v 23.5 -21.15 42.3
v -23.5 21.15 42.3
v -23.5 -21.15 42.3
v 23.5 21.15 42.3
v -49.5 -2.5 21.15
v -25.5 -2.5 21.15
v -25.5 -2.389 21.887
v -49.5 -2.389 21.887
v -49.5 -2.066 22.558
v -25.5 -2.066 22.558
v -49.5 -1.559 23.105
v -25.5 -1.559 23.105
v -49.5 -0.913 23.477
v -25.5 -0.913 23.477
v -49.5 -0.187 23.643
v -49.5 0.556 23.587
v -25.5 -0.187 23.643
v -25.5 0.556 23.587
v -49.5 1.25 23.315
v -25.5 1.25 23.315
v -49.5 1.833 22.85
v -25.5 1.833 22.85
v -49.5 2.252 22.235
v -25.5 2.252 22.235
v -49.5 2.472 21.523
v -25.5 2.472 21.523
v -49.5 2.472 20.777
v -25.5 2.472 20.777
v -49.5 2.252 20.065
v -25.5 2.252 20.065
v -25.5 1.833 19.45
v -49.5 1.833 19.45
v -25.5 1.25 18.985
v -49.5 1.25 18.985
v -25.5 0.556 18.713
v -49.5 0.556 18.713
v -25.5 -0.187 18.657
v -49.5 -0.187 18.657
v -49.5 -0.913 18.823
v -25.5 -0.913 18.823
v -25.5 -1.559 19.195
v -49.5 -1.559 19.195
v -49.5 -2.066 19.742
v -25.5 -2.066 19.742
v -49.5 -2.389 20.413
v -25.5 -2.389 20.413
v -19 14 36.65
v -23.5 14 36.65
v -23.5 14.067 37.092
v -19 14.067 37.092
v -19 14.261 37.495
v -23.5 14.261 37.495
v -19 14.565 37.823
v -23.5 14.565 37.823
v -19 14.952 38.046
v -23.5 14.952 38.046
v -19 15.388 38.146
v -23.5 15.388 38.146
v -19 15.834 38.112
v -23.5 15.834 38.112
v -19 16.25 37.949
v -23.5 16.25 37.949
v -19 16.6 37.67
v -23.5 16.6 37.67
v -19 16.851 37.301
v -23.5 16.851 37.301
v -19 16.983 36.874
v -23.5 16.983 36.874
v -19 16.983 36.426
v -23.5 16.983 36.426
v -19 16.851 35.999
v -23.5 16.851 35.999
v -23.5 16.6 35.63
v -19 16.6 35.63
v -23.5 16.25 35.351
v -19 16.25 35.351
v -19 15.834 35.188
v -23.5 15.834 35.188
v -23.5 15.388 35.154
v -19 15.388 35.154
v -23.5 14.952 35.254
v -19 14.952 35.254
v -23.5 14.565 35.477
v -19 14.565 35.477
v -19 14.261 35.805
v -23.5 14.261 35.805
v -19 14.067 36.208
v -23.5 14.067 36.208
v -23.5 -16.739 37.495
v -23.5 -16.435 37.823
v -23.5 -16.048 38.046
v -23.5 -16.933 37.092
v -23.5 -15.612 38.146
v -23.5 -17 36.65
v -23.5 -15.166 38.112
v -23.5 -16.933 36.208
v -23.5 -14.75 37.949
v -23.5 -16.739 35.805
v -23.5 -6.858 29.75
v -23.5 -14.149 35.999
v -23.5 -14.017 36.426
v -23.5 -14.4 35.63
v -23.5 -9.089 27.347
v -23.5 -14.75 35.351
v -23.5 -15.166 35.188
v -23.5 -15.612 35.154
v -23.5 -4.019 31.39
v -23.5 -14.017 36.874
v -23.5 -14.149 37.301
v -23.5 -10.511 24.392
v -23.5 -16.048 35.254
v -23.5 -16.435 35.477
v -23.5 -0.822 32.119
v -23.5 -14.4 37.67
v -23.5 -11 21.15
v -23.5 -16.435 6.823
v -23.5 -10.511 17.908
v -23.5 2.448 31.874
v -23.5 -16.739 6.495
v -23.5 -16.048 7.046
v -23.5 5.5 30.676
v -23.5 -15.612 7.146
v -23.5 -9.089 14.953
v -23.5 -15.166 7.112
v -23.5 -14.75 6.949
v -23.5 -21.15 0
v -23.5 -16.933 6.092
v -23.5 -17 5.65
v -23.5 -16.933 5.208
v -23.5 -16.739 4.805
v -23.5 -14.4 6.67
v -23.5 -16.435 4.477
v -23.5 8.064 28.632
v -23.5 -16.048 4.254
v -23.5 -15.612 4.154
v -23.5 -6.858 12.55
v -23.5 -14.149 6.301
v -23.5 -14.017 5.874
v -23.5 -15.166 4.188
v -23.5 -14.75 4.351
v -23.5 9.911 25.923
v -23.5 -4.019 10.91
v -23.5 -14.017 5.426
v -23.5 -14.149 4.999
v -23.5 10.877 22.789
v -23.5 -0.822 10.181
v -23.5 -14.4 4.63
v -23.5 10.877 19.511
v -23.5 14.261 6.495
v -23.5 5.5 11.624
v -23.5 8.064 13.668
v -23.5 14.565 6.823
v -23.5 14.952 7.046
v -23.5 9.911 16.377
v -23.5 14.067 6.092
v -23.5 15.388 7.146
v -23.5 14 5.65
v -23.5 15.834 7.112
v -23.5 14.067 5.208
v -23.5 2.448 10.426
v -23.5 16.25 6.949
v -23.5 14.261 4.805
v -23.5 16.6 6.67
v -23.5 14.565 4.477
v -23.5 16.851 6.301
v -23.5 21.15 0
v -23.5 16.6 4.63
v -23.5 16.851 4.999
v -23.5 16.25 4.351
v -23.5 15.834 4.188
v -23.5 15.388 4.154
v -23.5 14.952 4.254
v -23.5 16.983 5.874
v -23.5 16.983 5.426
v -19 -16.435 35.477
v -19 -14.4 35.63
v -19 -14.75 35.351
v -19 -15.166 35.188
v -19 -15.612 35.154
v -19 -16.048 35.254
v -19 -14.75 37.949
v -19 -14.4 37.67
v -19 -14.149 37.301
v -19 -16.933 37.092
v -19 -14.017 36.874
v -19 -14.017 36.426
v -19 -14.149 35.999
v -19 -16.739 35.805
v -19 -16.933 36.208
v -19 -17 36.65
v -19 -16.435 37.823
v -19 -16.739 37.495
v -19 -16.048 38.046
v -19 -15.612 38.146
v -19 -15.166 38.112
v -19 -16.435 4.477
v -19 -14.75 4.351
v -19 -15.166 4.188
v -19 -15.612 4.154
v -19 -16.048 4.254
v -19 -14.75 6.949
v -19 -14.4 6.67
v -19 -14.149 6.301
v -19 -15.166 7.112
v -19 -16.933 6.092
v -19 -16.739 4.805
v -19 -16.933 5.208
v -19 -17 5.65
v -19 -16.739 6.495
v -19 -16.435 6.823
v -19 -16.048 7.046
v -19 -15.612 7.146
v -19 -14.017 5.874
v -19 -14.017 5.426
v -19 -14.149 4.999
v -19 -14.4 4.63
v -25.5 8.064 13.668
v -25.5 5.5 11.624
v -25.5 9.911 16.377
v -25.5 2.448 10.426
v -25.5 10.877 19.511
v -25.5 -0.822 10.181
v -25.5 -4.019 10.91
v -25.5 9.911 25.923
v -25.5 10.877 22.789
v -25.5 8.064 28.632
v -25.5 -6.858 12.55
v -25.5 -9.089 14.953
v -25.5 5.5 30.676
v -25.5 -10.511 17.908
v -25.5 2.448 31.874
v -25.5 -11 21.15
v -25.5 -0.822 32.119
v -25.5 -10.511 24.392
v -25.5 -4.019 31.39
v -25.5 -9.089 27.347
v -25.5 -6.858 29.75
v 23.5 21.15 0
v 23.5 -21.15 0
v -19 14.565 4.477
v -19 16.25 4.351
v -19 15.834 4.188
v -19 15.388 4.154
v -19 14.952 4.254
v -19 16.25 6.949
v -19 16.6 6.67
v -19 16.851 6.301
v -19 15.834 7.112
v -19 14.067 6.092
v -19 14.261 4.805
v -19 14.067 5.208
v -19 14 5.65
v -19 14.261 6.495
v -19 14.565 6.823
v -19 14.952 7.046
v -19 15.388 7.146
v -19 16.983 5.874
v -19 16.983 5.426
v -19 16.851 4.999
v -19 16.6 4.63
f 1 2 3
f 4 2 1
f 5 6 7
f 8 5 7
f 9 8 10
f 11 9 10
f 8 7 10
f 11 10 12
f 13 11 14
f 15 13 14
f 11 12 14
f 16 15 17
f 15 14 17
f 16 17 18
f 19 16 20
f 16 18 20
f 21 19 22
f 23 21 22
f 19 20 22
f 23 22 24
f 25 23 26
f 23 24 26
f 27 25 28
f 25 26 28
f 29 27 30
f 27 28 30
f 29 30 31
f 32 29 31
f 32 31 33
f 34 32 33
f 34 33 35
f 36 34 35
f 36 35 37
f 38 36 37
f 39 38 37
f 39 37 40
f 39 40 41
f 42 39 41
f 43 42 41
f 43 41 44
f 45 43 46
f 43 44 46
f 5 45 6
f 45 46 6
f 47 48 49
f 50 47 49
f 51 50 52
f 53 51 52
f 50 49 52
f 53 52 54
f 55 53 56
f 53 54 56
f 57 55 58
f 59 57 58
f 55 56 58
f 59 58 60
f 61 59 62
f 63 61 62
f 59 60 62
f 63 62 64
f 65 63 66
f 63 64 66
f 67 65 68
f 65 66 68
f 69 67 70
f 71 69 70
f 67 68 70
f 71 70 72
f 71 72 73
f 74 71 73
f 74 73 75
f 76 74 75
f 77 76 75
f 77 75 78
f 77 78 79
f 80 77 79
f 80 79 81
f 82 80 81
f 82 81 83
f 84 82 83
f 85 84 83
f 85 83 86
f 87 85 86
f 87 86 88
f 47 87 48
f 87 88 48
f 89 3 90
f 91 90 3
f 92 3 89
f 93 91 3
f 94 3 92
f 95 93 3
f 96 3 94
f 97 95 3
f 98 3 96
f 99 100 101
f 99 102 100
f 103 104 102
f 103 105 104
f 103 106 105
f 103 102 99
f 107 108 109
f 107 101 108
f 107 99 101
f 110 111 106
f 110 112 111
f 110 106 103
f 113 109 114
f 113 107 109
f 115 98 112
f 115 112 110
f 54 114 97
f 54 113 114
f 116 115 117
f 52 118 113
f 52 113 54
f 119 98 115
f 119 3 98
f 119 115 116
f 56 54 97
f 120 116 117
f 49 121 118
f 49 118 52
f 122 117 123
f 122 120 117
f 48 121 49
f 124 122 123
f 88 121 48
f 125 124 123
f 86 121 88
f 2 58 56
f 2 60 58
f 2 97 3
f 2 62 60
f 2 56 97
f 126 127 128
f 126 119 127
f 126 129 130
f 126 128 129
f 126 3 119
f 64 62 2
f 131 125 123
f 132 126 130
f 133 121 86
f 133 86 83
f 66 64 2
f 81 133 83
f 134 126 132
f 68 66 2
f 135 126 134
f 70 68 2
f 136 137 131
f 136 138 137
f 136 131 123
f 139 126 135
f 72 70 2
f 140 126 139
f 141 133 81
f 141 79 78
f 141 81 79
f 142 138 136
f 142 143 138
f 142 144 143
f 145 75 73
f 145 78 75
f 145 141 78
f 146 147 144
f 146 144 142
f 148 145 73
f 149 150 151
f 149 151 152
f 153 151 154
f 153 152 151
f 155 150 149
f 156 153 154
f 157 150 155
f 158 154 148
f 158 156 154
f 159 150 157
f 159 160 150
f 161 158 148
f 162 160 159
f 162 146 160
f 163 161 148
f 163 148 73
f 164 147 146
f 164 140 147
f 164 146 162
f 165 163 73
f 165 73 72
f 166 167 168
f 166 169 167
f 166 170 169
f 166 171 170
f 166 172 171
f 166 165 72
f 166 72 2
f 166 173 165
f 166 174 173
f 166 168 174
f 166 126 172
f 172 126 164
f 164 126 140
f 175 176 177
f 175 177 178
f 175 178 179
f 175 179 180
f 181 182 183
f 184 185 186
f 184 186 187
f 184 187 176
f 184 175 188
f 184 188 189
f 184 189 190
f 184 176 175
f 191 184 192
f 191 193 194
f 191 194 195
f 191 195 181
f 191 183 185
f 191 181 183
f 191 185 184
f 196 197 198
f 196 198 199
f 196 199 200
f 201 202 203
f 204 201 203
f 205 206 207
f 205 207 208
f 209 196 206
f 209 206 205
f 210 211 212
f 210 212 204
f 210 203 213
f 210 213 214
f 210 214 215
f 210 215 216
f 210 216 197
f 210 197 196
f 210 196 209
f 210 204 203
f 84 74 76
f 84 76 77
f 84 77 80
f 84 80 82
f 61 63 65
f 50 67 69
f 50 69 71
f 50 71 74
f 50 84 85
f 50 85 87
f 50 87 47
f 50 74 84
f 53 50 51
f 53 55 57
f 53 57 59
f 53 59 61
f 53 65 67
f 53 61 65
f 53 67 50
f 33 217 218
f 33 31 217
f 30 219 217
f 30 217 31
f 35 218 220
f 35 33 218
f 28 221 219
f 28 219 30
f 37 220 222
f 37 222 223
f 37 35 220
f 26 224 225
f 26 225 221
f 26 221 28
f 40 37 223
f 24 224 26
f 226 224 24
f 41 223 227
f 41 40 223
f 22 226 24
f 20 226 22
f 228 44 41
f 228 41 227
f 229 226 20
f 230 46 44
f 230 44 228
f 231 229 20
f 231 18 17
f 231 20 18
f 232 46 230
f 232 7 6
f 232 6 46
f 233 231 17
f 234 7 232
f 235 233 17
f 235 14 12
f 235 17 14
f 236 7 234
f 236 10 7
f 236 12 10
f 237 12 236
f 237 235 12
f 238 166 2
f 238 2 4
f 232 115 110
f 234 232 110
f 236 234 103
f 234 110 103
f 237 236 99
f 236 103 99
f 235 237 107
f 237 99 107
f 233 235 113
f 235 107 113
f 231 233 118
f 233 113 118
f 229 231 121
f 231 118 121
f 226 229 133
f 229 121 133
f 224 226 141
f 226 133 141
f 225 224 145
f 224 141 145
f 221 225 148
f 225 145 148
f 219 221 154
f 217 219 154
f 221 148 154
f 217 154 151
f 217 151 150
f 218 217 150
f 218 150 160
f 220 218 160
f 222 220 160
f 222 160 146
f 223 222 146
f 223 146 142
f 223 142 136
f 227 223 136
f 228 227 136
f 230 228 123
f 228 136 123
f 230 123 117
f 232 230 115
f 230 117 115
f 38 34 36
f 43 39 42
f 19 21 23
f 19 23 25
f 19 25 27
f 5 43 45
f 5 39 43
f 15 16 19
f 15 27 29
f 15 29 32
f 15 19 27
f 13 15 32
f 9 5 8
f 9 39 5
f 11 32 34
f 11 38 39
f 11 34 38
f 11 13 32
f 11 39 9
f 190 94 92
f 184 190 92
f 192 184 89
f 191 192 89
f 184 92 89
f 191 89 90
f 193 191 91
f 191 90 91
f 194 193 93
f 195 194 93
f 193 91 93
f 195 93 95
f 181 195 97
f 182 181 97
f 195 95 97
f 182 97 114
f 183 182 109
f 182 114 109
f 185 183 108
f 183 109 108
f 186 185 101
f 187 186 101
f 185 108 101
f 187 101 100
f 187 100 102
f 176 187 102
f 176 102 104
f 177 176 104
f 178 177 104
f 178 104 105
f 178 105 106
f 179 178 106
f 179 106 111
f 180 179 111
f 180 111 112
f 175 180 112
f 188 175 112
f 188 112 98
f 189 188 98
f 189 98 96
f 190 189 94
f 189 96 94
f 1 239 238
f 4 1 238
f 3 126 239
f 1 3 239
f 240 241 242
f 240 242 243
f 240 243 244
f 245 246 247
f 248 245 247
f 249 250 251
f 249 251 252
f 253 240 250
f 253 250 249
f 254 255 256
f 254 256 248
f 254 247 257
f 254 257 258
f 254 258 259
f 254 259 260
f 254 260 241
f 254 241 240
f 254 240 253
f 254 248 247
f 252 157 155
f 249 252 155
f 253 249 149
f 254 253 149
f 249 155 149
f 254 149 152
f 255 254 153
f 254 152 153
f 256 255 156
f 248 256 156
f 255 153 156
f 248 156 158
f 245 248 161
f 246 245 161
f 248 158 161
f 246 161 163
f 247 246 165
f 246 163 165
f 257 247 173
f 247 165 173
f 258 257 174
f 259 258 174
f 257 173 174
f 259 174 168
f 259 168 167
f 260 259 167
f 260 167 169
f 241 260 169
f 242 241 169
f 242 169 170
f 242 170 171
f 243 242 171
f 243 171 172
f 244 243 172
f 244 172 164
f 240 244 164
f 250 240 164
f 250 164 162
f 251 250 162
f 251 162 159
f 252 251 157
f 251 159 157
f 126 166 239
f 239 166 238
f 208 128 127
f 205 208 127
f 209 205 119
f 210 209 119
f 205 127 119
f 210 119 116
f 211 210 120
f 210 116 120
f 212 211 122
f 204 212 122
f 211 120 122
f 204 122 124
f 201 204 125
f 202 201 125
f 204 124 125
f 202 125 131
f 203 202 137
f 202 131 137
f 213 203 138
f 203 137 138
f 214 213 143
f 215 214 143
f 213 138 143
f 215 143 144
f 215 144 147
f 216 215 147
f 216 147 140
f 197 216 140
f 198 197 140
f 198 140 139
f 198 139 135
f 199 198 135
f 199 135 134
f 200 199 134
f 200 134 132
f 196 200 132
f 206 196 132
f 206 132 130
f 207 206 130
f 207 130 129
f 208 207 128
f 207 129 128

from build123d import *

# Parameters (mm, degrees)
SKETCH037_W     = 47
SKETCH037_H     = 42.3
PAD022_DEPTH    = 42.3
SKETCH038_R     = 1.5
POCKET020_DEPTH = 4.5
SKETCH039_R     = 11
PAD023_DEPTH    = 2
SKETCH040_R     = 2.5
PAD024_DEPTH    = 24


with BuildPart() as part:
    # Sketch037 → Pad022 (new body)
    with BuildSketch(Plane.XY):
        Rectangle(SKETCH037_W, SKETCH037_H)
    extrude(amount=PAD022_DEPTH)

    # Sketch038 (on Face4 of Pad022) → Pocket020 (cut)
    with BuildSketch(Plane(origin=(-23.5, 0, 0), x_dir=(0, -1, 0), z_dir=(-1, 0, 0))):
        with Locations((-15.5, 36.65)):
            Circle(SKETCH038_R)
        with Locations((15.5, 36.65)):
            Circle(SKETCH038_R)
        with Locations((-15.5, 5.65)):
            Circle(SKETCH038_R)
        with Locations((15.5, 5.65)):
            Circle(SKETCH038_R)
    extrude(amount=-POCKET020_DEPTH, mode=Mode.SUBTRACT)

    # Sketch039 (on Face2 of Pocket020) → Pad023 (join)
    with BuildSketch(Plane(origin=(-23.5, 0, 0), x_dir=(0, -1, 0), z_dir=(-1, 0, 0))):
        with Locations((0, 21.15)):
            Circle(SKETCH039_R)
    extrude(amount=PAD023_DEPTH)

    # Sketch040 (on Face13 of Pad023) → Pad024 (join)
    with BuildSketch(Plane(origin=(-25.5, 0, 0), x_dir=(0, -1, 0), z_dir=(-1, 0, 0))):
        with Locations((0, 21.15)):
            Circle(SKETCH040_R)
    extrude(amount=PAD024_DEPTH)


solid = part.part
